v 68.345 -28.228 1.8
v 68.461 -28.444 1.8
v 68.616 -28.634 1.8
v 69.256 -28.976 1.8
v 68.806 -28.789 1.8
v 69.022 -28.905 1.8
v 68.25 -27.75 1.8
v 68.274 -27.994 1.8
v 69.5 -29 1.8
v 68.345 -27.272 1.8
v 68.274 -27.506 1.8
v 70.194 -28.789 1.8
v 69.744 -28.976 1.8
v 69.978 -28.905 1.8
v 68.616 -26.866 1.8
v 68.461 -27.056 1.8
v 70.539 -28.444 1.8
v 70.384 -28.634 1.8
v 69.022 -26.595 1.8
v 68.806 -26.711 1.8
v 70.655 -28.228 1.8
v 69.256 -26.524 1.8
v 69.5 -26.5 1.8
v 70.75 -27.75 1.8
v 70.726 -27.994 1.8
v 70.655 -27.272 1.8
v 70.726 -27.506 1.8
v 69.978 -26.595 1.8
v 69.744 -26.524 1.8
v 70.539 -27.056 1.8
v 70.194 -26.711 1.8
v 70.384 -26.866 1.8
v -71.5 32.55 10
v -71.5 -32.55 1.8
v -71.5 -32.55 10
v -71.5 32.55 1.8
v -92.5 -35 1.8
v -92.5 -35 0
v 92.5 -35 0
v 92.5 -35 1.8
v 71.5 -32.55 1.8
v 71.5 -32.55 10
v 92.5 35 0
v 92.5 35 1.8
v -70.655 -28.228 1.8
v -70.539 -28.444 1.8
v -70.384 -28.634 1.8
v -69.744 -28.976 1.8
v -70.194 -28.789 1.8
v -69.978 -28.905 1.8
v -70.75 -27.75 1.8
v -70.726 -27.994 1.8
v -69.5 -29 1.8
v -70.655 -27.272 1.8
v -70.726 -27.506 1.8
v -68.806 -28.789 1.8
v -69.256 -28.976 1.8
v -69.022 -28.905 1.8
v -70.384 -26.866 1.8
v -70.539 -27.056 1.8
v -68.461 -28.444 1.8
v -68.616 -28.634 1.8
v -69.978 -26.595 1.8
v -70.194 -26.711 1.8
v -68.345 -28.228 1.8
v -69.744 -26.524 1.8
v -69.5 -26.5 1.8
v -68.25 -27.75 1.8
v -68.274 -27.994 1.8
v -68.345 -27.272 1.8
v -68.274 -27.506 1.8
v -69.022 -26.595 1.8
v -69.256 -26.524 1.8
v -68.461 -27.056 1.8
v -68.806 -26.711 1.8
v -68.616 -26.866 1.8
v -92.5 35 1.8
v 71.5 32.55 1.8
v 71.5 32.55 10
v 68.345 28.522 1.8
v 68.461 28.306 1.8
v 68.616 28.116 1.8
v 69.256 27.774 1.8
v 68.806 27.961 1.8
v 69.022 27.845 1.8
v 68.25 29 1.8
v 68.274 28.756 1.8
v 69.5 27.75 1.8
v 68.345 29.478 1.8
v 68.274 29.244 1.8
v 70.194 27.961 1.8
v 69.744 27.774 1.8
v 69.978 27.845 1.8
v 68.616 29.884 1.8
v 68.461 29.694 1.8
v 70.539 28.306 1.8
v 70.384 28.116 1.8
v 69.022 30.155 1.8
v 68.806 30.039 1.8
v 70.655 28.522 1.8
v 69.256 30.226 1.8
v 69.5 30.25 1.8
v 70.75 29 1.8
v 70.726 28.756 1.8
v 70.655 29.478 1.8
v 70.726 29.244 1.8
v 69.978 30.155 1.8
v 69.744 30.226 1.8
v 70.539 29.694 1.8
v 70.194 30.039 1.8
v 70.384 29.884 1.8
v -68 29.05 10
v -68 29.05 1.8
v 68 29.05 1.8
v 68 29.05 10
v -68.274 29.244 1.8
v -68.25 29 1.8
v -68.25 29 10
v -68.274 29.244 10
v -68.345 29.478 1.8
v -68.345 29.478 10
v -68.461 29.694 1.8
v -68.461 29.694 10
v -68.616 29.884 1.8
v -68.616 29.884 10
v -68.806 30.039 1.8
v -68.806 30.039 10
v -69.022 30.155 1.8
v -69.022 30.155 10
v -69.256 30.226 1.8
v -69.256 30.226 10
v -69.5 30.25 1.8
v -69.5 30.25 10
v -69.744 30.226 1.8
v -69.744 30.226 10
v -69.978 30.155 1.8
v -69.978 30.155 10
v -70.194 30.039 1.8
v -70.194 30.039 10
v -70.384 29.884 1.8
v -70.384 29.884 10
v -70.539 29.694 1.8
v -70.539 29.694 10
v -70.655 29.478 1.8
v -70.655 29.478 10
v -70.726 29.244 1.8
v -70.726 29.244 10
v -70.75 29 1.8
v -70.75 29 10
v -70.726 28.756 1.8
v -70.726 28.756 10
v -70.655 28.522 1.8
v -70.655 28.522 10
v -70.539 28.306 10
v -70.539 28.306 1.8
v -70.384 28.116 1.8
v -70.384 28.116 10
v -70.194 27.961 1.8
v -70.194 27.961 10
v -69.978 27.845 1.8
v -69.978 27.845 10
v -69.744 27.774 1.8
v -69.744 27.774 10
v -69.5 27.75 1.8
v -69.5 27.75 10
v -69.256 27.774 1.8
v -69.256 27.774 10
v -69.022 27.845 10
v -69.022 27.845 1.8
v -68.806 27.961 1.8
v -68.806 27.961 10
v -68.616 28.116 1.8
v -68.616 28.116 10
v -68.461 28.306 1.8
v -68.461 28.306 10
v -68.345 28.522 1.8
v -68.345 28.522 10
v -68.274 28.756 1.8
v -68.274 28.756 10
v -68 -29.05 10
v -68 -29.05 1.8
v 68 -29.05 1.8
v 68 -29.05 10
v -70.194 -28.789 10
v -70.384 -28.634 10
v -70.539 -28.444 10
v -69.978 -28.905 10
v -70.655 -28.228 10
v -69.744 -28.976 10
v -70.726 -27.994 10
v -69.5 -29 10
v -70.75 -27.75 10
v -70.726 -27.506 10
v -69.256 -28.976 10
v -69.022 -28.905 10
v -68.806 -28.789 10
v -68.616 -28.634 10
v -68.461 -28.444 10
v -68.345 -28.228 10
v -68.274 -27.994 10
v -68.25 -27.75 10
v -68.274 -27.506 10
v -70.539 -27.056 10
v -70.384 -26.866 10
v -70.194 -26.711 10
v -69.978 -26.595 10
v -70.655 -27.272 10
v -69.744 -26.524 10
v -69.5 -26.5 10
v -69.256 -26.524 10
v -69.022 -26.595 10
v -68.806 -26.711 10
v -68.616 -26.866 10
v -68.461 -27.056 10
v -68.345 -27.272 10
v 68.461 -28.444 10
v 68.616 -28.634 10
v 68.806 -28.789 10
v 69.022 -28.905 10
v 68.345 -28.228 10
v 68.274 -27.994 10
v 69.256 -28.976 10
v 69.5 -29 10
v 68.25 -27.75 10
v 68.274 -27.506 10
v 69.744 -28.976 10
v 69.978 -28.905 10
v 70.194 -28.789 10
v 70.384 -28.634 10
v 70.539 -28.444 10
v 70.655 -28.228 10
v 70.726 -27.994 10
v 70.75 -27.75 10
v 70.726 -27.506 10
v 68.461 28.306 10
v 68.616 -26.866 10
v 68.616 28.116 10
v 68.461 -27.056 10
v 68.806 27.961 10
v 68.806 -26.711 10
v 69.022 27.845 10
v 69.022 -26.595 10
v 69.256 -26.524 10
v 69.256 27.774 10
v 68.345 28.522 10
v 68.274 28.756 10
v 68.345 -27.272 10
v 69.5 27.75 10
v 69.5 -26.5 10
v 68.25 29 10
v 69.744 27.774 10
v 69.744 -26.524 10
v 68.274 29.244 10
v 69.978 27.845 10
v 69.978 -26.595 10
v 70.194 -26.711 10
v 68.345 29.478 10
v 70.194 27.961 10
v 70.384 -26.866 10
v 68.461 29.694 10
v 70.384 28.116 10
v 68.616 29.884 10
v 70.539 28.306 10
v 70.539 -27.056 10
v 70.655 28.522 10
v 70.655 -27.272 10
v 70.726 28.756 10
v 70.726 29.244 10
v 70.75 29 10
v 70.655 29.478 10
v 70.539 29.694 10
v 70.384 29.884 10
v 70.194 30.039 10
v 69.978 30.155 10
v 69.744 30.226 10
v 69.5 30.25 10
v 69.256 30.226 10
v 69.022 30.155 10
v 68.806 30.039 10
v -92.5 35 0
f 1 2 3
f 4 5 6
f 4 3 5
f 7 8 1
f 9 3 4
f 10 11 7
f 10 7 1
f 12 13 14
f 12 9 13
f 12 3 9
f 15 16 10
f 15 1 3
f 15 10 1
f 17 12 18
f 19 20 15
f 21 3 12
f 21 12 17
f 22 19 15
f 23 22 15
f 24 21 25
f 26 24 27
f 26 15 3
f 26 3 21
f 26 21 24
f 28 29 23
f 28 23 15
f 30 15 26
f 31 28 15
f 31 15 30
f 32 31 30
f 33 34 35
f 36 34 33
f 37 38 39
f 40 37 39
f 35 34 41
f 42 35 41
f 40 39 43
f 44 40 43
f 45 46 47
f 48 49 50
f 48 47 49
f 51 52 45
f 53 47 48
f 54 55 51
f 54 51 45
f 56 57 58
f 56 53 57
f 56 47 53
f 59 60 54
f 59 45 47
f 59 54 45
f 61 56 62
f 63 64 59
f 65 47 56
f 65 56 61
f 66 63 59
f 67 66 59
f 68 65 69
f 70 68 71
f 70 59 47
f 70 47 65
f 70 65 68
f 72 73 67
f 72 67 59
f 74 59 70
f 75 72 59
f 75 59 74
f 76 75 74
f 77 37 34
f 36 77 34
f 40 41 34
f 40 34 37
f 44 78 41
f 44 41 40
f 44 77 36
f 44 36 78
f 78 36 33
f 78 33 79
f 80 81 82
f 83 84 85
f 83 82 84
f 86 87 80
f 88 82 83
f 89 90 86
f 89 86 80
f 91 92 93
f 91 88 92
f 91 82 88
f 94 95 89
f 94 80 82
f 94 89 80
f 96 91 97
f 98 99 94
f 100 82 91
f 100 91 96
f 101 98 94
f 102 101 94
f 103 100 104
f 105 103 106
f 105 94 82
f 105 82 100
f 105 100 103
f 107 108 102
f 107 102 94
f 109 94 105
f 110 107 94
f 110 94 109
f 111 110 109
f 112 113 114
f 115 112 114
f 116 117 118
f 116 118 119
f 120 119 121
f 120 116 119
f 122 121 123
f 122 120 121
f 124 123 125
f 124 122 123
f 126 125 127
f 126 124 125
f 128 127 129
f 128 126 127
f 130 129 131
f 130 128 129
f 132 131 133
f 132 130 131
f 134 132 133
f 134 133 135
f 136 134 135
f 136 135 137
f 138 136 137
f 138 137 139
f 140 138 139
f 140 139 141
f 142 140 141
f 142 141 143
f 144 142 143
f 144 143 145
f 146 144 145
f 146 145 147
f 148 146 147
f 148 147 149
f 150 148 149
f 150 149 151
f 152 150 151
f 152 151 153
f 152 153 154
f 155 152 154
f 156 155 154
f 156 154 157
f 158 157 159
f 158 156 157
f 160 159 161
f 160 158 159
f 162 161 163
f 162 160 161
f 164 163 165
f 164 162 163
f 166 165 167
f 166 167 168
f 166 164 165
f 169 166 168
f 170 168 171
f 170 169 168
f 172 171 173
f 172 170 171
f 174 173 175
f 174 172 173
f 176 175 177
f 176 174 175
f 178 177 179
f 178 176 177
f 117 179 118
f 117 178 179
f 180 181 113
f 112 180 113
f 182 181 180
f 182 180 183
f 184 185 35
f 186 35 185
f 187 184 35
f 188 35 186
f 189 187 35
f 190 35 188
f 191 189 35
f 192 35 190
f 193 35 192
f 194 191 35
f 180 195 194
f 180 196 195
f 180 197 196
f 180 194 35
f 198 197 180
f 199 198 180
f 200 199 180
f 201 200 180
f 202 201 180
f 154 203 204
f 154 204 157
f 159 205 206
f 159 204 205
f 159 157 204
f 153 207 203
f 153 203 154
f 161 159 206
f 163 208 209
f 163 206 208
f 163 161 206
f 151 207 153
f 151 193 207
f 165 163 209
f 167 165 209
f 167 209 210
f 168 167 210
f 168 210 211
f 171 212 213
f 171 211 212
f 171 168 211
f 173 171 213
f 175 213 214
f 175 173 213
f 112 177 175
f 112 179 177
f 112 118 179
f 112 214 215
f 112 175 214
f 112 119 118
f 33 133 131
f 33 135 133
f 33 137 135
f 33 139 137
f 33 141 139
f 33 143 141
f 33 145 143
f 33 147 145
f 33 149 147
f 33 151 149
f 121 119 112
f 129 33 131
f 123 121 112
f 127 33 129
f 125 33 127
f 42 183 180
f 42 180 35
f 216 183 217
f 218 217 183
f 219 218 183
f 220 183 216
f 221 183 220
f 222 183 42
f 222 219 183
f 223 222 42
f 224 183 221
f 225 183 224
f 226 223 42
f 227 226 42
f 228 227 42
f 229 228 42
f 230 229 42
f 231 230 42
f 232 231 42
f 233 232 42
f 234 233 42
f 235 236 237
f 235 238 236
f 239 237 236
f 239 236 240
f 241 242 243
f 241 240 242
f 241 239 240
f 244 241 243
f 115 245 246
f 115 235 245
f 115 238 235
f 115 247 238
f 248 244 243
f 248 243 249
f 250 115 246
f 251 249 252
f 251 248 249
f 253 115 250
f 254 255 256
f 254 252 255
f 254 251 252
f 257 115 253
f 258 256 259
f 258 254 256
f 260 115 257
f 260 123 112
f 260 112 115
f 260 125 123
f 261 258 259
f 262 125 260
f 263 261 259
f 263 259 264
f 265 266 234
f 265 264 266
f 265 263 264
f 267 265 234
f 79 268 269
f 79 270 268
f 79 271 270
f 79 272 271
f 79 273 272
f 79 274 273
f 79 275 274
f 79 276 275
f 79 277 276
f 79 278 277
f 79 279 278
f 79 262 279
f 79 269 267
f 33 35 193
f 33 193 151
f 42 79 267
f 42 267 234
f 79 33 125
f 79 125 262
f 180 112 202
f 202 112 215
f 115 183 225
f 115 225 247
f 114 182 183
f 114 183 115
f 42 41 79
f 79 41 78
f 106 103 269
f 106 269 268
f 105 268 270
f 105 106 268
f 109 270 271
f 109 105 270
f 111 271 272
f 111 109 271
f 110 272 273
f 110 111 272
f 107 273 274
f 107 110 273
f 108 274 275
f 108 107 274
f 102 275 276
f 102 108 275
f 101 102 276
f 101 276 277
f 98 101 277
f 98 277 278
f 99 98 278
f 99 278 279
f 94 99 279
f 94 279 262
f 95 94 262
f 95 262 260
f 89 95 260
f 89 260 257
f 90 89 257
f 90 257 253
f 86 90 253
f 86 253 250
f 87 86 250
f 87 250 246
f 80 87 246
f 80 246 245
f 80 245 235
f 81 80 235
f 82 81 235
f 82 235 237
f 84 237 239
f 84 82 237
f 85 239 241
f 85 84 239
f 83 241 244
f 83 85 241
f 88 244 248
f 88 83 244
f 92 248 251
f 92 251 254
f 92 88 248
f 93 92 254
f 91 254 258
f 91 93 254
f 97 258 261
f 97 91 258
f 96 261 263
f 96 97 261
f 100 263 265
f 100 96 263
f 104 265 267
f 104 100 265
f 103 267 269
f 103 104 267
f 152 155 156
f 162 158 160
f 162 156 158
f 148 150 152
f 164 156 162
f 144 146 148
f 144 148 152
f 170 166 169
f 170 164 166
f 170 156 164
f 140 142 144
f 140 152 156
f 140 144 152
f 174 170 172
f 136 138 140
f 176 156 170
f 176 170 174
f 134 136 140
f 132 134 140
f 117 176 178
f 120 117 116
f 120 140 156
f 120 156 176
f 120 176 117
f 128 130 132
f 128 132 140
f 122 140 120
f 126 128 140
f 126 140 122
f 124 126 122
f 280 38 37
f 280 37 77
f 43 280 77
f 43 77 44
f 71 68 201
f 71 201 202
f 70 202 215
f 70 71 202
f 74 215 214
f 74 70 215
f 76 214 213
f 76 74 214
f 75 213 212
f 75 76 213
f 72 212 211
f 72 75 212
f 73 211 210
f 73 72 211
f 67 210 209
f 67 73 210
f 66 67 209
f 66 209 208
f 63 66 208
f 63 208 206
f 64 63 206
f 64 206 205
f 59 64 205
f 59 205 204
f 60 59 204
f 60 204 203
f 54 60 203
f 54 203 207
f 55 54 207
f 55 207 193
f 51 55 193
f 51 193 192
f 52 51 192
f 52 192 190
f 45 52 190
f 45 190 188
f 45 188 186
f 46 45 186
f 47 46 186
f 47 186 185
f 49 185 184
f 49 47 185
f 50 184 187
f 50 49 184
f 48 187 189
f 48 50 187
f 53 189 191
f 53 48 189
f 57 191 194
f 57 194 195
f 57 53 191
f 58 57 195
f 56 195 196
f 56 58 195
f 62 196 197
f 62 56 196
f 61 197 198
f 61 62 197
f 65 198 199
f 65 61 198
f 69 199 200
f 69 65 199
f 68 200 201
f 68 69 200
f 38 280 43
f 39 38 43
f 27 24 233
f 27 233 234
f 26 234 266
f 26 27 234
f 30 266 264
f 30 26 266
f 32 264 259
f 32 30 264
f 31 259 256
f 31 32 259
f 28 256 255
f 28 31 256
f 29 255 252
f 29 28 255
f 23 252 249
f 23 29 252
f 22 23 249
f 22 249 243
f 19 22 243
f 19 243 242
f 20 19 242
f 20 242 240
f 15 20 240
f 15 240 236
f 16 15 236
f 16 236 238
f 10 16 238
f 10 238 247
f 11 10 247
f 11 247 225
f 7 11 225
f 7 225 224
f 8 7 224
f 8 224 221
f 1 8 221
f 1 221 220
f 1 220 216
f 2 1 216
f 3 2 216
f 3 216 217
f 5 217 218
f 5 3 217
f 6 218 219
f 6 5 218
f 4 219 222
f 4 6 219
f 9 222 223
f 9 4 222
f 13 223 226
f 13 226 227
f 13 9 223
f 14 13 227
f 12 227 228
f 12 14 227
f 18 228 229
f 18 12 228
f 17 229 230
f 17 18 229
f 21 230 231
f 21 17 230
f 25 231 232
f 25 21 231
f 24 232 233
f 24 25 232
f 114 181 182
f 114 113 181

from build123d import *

# Parameters (mm, degrees)
F0_W     = 185
F0_H     = 70
F0_W_2   = 143
F0_H_2   = 65.1
F0_R     = 1.25
F0_W_3   = 136
F0_H_3   = 58.1
F1_DEPTH = 1.8
F2_DEPTH = 10


with BuildPart() as f1:
    # F0 (on Top) → F1 (new body)
    with BuildSketch(Plane.XY):
        Rectangle(F0_W, F0_H)
        Rectangle(F0_W_2, F0_H_2, mode=Mode.SUBTRACT)
        Rectangle(F0_W_2, F0_H_2)
        with Locations((-69.5, -27.75)):
            Circle(F0_R, mode=Mode.SUBTRACT)
        with Locations((69.5, -27.75)):
            Circle(F0_R, mode=Mode.SUBTRACT)
        with Locations((-69.5, 29)):
            Circle(F0_R, mode=Mode.SUBTRACT)
        Rectangle(F0_W_3, F0_H_3, mode=Mode.SUBTRACT)
        with Locations((69.5, 29)):
            Circle(F0_R, mode=Mode.SUBTRACT)
        Rectangle(F0_W_3, F0_H_3)
        with Locations((-69.5, -27.75)):
            Circle(F0_R)
        with Locations((-69.5, 29)):
            Circle(F0_R)
        with Locations((69.5, 29)):
            Circle(F0_R)
        with Locations((69.5, -27.75)):
            Circle(F0_R)
    extrude(amount=F1_DEPTH)

    # F0 (on Top) → F2 (join)
    with BuildSketch(Plane.XY):
        Rectangle(F0_W_2, F0_H_2)
        with Locations((-69.5, -27.75)):
            Circle(F0_R, mode=Mode.SUBTRACT)
        with Locations((69.5, -27.75)):
            Circle(F0_R, mode=Mode.SUBTRACT)
        with Locations((-69.5, 29)):
            Circle(F0_R, mode=Mode.SUBTRACT)
        Rectangle(F0_W_3, F0_H_3, mode=Mode.SUBTRACT)
        with Locations((69.5, 29)):
            Circle(F0_R, mode=Mode.SUBTRACT)
    extrude(amount=F2_DEPTH)


solid = f1.part
